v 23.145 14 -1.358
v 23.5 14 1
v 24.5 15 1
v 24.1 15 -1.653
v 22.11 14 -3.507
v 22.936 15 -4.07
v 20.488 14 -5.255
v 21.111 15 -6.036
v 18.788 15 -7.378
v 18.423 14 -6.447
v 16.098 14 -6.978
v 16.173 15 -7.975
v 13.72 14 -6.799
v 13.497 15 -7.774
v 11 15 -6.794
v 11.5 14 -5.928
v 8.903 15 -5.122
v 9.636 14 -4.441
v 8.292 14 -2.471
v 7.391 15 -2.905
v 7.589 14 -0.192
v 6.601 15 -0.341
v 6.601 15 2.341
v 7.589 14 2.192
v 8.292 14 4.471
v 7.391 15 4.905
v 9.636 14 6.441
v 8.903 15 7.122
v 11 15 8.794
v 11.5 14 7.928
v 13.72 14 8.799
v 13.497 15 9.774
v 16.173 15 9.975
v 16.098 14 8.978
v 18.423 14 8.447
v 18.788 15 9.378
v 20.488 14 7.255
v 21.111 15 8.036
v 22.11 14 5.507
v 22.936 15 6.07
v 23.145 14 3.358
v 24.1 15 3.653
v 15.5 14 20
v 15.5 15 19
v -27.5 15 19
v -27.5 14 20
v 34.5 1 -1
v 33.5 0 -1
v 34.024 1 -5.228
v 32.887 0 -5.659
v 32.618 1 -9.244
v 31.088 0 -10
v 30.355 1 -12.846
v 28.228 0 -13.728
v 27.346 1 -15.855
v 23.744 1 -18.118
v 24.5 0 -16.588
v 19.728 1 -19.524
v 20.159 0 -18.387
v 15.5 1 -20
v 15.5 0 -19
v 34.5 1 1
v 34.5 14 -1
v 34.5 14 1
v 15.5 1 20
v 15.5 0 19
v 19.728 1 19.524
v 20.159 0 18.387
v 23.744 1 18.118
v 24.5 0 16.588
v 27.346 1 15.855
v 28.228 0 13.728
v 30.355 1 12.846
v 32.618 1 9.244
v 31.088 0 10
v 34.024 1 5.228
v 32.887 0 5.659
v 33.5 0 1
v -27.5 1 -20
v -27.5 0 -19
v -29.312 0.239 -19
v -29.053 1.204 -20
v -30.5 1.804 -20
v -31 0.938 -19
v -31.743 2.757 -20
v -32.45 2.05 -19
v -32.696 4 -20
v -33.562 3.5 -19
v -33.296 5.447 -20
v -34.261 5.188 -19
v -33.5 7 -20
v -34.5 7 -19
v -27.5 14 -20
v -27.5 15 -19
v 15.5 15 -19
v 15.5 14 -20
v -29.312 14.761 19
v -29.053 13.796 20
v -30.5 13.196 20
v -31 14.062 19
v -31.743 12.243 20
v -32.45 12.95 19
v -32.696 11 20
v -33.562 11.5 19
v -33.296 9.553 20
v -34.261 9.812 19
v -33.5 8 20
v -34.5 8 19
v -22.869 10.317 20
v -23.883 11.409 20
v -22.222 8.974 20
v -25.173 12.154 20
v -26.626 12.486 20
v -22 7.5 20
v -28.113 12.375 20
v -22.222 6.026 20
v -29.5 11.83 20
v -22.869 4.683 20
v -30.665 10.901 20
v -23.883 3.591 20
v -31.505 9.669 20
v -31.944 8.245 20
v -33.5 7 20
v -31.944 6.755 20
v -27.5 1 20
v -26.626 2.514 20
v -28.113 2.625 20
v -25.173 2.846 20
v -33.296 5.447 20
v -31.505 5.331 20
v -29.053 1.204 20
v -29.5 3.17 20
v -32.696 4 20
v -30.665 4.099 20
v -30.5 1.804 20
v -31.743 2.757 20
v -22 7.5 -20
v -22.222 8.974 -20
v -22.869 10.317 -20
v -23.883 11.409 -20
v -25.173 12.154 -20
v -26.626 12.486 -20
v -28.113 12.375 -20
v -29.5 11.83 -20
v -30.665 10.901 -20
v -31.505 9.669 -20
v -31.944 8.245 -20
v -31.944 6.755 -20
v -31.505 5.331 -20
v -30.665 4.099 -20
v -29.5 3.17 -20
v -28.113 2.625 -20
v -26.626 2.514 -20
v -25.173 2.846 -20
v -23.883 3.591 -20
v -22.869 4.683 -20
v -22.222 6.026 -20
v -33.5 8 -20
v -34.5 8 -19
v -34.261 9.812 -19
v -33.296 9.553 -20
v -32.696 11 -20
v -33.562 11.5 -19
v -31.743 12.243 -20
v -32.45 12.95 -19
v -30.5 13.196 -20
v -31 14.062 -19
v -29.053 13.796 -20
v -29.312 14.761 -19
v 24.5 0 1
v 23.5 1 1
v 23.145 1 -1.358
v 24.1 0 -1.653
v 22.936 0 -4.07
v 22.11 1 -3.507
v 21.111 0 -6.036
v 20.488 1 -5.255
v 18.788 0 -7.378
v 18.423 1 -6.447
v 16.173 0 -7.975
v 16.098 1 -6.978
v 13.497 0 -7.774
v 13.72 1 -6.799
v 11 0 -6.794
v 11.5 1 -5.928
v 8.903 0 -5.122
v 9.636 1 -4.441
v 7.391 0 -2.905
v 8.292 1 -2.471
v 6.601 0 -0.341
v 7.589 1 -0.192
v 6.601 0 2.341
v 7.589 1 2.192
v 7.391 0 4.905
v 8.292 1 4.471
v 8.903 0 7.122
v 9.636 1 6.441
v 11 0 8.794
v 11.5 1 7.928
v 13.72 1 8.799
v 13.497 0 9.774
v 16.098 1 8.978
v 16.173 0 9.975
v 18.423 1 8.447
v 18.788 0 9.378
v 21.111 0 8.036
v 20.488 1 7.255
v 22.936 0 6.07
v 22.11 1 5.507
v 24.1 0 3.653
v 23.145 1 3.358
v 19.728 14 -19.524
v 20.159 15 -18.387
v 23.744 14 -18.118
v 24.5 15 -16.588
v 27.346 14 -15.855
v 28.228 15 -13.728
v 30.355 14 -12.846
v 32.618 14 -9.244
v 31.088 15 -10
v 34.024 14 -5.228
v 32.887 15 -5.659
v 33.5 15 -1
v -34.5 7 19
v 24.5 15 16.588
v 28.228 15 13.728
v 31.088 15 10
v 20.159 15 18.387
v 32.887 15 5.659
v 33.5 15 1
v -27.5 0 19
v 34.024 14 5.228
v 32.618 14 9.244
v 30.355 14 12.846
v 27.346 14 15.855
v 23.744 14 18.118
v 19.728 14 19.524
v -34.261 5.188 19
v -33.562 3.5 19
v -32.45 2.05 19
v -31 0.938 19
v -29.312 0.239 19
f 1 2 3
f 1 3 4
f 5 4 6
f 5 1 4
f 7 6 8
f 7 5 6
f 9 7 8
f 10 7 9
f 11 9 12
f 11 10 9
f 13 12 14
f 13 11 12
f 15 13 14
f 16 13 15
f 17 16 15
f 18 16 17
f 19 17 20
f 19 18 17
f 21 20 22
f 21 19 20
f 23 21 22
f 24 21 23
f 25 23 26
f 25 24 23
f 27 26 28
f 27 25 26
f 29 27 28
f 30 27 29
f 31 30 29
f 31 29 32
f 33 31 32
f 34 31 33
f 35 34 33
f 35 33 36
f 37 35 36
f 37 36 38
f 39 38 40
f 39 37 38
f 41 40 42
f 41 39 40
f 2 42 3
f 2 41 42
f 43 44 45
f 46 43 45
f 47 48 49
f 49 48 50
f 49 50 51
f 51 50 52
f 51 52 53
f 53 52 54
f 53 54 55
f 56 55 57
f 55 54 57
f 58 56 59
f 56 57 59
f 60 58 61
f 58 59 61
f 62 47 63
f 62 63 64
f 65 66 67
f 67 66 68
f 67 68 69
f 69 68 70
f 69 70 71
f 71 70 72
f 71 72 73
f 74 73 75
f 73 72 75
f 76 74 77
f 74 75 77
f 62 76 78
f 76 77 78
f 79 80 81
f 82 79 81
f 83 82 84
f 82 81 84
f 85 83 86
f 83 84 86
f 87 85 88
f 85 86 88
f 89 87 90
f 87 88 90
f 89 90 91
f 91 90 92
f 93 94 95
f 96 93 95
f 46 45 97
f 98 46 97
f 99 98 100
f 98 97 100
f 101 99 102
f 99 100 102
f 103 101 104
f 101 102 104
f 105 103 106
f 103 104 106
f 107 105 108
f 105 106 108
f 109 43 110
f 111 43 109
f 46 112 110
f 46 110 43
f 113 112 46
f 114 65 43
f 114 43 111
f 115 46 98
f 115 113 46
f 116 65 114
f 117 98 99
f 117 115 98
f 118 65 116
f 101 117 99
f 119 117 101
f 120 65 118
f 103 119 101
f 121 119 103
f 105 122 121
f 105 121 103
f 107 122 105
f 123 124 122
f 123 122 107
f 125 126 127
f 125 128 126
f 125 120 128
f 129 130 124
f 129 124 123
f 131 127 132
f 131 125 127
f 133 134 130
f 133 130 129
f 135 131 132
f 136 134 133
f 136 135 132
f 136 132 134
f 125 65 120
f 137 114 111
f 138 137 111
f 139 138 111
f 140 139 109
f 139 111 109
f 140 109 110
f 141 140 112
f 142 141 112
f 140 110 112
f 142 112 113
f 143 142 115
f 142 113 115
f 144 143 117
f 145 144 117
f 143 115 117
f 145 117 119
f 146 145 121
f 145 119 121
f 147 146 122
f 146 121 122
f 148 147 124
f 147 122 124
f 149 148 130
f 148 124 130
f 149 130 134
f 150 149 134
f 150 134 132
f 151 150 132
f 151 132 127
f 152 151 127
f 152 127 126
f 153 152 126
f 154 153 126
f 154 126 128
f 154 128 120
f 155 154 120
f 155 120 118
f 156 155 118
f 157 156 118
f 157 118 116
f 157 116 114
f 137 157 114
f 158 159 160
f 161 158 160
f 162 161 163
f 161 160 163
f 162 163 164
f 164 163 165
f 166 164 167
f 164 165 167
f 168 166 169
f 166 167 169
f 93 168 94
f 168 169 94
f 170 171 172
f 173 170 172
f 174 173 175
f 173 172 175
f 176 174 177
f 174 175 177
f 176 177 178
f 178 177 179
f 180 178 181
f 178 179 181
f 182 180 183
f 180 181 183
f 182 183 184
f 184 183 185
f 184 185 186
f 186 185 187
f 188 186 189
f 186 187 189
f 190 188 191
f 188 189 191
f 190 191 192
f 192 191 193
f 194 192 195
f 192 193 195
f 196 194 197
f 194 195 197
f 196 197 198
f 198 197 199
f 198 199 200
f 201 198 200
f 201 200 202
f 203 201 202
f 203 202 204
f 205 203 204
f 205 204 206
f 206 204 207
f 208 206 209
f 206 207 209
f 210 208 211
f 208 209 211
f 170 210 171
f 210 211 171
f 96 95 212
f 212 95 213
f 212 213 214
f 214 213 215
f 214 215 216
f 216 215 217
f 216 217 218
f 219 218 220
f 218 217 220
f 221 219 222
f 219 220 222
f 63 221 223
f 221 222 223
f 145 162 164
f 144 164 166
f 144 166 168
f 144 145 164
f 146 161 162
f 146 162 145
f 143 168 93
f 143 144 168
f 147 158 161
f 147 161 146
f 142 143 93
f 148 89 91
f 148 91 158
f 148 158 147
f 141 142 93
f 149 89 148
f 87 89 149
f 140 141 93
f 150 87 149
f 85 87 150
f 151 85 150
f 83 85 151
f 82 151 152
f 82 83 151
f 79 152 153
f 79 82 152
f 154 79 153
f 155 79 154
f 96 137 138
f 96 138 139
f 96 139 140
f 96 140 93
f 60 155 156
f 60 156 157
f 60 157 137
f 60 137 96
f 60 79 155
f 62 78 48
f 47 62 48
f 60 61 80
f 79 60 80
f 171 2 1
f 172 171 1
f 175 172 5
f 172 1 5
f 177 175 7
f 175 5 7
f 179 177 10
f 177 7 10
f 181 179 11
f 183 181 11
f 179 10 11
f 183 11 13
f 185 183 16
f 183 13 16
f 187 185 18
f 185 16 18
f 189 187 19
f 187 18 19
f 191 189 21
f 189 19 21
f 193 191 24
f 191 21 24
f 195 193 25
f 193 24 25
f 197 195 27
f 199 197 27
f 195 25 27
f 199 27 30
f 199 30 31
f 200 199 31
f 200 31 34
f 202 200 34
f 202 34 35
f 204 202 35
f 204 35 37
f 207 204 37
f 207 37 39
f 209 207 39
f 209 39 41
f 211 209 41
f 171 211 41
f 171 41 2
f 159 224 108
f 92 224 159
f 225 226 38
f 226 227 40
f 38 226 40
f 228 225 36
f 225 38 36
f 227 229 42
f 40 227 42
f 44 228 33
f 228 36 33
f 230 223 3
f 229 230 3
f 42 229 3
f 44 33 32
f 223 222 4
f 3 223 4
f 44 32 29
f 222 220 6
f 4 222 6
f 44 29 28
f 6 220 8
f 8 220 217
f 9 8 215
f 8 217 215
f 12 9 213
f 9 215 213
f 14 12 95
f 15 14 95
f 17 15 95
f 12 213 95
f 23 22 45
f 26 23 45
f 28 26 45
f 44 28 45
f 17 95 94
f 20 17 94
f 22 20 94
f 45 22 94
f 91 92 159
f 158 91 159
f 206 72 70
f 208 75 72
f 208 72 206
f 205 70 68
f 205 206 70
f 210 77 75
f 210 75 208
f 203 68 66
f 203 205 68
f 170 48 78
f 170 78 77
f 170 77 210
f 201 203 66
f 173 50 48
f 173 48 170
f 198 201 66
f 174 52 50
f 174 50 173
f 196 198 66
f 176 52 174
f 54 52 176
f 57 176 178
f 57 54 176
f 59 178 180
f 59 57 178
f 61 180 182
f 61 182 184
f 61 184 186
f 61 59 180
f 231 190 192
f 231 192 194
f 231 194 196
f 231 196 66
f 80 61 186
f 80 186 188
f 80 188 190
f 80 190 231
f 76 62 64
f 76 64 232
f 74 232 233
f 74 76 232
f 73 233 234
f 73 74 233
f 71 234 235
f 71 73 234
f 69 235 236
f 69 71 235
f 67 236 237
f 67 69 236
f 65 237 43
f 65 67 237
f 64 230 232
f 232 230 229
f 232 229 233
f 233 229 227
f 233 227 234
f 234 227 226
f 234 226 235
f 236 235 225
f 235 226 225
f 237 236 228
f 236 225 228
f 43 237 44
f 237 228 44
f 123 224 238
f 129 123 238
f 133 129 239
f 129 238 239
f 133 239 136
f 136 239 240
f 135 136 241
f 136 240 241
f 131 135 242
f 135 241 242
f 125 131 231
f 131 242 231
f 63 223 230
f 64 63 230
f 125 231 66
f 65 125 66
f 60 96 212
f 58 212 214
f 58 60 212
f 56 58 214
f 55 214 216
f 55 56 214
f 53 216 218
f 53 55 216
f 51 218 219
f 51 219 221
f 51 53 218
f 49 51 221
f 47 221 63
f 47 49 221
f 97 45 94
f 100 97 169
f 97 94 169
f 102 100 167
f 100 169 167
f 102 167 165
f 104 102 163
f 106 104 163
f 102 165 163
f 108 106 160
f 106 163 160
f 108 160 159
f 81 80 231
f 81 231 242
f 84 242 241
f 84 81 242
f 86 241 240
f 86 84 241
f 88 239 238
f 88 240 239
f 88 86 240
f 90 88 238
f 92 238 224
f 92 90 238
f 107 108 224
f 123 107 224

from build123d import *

# Parameters (mm, degrees)
BOSS_EXTRUDE1_DEPTH = 15
SKETCH2_R           = 5
CUT_EXTRUDE1_DEPTH  = 41
FILLET1_R           = 7
SKETCH3_R           = 8
CUT_EXTRUDE2_DEPTH  = 16
CHAMFER1_SIZE       = 1


with BuildPart() as part:
    # Sketch1 → Boss-Extrude1 (new body)
    with BuildSketch(Plane(origin=(0, 0, 0), x_dir=(1, 0, 0), z_dir=(0, 1, 0))):
        with BuildLine():
            Line((15.5, -20), (-34.5, -20))
            Line((-34.5, -20), (-34.5, 20))
            Line((-34.5, 20), (15.5, 20))
            ThreePointArc((15.5, 20), (28.935028843, 14.435028843), (34.5, 1))
            Line((34.5, 1), (34.5, -1))
            ThreePointArc((34.5, -1), (28.935028843, -14.435028843), (15.5, -20))
        make_face()
    extrude(amount=BOSS_EXTRUDE1_DEPTH)

    # Sketch2 → Cut-Extrude1 (cut, through all)
    with BuildSketch(Plane.XY.offset(20)):
        with Locations((-27, 7.5)):
            Circle(SKETCH2_R)
    extrude(amount=-CUT_EXTRUDE1_DEPTH, mode=Mode.SUBTRACT)

    # Fillet1
    fillet1_edges = [part.edges().sort_by_distance(p)[0] for p in [
        (-34.5, 15, 0),
        (-34.5, 0, 0),
    ]]
    fillet(fillet1_edges, radius=FILLET1_R)

    # Sketch3 → Cut-Extrude2 (cut, through all)
    with BuildSketch(Plane(origin=(0, 15, 0), x_dir=(1, 0, 0), z_dir=(0, 1, 0))):
        with Locations((15.5, -1)):
            Circle(SKETCH3_R)
    extrude(amount=-CUT_EXTRUDE2_DEPTH, mode=Mode.SUBTRACT)

    # Chamfer1
    chamfer1_edges = [part.edges().sort_by_distance(p)[0] for p in [
        (28.935028843, 15, 14.435028843),
        (34.5, 15, 0),
        (28.935028843, 15, -14.435028843),
        (-6, 15, -20),
        (-34.5, 7.5, 20),
        (-34.5, 7.5, -20),
        (-6, 0, 20),
        (-6, 15, 20),
        (-32.449747468, 12.949747468, 20),
        (-32.449747468, 2.050252532, 20),
        (-32.449747468, 12.949747468, -20),
        (-32.449747468, 2.050252532, -20),
        (7.5, 0, 1),
        (7.5, 15, 1),
        (-6, 0, -20),
        (28.935028843, 0, -14.435028843),
        (34.5, 0, 0),
        (28.935028843, 0, 14.435028843),
    ]]
    chamfer(chamfer1_edges, length=CHAMFER1_SIZE)


solid = part.part
